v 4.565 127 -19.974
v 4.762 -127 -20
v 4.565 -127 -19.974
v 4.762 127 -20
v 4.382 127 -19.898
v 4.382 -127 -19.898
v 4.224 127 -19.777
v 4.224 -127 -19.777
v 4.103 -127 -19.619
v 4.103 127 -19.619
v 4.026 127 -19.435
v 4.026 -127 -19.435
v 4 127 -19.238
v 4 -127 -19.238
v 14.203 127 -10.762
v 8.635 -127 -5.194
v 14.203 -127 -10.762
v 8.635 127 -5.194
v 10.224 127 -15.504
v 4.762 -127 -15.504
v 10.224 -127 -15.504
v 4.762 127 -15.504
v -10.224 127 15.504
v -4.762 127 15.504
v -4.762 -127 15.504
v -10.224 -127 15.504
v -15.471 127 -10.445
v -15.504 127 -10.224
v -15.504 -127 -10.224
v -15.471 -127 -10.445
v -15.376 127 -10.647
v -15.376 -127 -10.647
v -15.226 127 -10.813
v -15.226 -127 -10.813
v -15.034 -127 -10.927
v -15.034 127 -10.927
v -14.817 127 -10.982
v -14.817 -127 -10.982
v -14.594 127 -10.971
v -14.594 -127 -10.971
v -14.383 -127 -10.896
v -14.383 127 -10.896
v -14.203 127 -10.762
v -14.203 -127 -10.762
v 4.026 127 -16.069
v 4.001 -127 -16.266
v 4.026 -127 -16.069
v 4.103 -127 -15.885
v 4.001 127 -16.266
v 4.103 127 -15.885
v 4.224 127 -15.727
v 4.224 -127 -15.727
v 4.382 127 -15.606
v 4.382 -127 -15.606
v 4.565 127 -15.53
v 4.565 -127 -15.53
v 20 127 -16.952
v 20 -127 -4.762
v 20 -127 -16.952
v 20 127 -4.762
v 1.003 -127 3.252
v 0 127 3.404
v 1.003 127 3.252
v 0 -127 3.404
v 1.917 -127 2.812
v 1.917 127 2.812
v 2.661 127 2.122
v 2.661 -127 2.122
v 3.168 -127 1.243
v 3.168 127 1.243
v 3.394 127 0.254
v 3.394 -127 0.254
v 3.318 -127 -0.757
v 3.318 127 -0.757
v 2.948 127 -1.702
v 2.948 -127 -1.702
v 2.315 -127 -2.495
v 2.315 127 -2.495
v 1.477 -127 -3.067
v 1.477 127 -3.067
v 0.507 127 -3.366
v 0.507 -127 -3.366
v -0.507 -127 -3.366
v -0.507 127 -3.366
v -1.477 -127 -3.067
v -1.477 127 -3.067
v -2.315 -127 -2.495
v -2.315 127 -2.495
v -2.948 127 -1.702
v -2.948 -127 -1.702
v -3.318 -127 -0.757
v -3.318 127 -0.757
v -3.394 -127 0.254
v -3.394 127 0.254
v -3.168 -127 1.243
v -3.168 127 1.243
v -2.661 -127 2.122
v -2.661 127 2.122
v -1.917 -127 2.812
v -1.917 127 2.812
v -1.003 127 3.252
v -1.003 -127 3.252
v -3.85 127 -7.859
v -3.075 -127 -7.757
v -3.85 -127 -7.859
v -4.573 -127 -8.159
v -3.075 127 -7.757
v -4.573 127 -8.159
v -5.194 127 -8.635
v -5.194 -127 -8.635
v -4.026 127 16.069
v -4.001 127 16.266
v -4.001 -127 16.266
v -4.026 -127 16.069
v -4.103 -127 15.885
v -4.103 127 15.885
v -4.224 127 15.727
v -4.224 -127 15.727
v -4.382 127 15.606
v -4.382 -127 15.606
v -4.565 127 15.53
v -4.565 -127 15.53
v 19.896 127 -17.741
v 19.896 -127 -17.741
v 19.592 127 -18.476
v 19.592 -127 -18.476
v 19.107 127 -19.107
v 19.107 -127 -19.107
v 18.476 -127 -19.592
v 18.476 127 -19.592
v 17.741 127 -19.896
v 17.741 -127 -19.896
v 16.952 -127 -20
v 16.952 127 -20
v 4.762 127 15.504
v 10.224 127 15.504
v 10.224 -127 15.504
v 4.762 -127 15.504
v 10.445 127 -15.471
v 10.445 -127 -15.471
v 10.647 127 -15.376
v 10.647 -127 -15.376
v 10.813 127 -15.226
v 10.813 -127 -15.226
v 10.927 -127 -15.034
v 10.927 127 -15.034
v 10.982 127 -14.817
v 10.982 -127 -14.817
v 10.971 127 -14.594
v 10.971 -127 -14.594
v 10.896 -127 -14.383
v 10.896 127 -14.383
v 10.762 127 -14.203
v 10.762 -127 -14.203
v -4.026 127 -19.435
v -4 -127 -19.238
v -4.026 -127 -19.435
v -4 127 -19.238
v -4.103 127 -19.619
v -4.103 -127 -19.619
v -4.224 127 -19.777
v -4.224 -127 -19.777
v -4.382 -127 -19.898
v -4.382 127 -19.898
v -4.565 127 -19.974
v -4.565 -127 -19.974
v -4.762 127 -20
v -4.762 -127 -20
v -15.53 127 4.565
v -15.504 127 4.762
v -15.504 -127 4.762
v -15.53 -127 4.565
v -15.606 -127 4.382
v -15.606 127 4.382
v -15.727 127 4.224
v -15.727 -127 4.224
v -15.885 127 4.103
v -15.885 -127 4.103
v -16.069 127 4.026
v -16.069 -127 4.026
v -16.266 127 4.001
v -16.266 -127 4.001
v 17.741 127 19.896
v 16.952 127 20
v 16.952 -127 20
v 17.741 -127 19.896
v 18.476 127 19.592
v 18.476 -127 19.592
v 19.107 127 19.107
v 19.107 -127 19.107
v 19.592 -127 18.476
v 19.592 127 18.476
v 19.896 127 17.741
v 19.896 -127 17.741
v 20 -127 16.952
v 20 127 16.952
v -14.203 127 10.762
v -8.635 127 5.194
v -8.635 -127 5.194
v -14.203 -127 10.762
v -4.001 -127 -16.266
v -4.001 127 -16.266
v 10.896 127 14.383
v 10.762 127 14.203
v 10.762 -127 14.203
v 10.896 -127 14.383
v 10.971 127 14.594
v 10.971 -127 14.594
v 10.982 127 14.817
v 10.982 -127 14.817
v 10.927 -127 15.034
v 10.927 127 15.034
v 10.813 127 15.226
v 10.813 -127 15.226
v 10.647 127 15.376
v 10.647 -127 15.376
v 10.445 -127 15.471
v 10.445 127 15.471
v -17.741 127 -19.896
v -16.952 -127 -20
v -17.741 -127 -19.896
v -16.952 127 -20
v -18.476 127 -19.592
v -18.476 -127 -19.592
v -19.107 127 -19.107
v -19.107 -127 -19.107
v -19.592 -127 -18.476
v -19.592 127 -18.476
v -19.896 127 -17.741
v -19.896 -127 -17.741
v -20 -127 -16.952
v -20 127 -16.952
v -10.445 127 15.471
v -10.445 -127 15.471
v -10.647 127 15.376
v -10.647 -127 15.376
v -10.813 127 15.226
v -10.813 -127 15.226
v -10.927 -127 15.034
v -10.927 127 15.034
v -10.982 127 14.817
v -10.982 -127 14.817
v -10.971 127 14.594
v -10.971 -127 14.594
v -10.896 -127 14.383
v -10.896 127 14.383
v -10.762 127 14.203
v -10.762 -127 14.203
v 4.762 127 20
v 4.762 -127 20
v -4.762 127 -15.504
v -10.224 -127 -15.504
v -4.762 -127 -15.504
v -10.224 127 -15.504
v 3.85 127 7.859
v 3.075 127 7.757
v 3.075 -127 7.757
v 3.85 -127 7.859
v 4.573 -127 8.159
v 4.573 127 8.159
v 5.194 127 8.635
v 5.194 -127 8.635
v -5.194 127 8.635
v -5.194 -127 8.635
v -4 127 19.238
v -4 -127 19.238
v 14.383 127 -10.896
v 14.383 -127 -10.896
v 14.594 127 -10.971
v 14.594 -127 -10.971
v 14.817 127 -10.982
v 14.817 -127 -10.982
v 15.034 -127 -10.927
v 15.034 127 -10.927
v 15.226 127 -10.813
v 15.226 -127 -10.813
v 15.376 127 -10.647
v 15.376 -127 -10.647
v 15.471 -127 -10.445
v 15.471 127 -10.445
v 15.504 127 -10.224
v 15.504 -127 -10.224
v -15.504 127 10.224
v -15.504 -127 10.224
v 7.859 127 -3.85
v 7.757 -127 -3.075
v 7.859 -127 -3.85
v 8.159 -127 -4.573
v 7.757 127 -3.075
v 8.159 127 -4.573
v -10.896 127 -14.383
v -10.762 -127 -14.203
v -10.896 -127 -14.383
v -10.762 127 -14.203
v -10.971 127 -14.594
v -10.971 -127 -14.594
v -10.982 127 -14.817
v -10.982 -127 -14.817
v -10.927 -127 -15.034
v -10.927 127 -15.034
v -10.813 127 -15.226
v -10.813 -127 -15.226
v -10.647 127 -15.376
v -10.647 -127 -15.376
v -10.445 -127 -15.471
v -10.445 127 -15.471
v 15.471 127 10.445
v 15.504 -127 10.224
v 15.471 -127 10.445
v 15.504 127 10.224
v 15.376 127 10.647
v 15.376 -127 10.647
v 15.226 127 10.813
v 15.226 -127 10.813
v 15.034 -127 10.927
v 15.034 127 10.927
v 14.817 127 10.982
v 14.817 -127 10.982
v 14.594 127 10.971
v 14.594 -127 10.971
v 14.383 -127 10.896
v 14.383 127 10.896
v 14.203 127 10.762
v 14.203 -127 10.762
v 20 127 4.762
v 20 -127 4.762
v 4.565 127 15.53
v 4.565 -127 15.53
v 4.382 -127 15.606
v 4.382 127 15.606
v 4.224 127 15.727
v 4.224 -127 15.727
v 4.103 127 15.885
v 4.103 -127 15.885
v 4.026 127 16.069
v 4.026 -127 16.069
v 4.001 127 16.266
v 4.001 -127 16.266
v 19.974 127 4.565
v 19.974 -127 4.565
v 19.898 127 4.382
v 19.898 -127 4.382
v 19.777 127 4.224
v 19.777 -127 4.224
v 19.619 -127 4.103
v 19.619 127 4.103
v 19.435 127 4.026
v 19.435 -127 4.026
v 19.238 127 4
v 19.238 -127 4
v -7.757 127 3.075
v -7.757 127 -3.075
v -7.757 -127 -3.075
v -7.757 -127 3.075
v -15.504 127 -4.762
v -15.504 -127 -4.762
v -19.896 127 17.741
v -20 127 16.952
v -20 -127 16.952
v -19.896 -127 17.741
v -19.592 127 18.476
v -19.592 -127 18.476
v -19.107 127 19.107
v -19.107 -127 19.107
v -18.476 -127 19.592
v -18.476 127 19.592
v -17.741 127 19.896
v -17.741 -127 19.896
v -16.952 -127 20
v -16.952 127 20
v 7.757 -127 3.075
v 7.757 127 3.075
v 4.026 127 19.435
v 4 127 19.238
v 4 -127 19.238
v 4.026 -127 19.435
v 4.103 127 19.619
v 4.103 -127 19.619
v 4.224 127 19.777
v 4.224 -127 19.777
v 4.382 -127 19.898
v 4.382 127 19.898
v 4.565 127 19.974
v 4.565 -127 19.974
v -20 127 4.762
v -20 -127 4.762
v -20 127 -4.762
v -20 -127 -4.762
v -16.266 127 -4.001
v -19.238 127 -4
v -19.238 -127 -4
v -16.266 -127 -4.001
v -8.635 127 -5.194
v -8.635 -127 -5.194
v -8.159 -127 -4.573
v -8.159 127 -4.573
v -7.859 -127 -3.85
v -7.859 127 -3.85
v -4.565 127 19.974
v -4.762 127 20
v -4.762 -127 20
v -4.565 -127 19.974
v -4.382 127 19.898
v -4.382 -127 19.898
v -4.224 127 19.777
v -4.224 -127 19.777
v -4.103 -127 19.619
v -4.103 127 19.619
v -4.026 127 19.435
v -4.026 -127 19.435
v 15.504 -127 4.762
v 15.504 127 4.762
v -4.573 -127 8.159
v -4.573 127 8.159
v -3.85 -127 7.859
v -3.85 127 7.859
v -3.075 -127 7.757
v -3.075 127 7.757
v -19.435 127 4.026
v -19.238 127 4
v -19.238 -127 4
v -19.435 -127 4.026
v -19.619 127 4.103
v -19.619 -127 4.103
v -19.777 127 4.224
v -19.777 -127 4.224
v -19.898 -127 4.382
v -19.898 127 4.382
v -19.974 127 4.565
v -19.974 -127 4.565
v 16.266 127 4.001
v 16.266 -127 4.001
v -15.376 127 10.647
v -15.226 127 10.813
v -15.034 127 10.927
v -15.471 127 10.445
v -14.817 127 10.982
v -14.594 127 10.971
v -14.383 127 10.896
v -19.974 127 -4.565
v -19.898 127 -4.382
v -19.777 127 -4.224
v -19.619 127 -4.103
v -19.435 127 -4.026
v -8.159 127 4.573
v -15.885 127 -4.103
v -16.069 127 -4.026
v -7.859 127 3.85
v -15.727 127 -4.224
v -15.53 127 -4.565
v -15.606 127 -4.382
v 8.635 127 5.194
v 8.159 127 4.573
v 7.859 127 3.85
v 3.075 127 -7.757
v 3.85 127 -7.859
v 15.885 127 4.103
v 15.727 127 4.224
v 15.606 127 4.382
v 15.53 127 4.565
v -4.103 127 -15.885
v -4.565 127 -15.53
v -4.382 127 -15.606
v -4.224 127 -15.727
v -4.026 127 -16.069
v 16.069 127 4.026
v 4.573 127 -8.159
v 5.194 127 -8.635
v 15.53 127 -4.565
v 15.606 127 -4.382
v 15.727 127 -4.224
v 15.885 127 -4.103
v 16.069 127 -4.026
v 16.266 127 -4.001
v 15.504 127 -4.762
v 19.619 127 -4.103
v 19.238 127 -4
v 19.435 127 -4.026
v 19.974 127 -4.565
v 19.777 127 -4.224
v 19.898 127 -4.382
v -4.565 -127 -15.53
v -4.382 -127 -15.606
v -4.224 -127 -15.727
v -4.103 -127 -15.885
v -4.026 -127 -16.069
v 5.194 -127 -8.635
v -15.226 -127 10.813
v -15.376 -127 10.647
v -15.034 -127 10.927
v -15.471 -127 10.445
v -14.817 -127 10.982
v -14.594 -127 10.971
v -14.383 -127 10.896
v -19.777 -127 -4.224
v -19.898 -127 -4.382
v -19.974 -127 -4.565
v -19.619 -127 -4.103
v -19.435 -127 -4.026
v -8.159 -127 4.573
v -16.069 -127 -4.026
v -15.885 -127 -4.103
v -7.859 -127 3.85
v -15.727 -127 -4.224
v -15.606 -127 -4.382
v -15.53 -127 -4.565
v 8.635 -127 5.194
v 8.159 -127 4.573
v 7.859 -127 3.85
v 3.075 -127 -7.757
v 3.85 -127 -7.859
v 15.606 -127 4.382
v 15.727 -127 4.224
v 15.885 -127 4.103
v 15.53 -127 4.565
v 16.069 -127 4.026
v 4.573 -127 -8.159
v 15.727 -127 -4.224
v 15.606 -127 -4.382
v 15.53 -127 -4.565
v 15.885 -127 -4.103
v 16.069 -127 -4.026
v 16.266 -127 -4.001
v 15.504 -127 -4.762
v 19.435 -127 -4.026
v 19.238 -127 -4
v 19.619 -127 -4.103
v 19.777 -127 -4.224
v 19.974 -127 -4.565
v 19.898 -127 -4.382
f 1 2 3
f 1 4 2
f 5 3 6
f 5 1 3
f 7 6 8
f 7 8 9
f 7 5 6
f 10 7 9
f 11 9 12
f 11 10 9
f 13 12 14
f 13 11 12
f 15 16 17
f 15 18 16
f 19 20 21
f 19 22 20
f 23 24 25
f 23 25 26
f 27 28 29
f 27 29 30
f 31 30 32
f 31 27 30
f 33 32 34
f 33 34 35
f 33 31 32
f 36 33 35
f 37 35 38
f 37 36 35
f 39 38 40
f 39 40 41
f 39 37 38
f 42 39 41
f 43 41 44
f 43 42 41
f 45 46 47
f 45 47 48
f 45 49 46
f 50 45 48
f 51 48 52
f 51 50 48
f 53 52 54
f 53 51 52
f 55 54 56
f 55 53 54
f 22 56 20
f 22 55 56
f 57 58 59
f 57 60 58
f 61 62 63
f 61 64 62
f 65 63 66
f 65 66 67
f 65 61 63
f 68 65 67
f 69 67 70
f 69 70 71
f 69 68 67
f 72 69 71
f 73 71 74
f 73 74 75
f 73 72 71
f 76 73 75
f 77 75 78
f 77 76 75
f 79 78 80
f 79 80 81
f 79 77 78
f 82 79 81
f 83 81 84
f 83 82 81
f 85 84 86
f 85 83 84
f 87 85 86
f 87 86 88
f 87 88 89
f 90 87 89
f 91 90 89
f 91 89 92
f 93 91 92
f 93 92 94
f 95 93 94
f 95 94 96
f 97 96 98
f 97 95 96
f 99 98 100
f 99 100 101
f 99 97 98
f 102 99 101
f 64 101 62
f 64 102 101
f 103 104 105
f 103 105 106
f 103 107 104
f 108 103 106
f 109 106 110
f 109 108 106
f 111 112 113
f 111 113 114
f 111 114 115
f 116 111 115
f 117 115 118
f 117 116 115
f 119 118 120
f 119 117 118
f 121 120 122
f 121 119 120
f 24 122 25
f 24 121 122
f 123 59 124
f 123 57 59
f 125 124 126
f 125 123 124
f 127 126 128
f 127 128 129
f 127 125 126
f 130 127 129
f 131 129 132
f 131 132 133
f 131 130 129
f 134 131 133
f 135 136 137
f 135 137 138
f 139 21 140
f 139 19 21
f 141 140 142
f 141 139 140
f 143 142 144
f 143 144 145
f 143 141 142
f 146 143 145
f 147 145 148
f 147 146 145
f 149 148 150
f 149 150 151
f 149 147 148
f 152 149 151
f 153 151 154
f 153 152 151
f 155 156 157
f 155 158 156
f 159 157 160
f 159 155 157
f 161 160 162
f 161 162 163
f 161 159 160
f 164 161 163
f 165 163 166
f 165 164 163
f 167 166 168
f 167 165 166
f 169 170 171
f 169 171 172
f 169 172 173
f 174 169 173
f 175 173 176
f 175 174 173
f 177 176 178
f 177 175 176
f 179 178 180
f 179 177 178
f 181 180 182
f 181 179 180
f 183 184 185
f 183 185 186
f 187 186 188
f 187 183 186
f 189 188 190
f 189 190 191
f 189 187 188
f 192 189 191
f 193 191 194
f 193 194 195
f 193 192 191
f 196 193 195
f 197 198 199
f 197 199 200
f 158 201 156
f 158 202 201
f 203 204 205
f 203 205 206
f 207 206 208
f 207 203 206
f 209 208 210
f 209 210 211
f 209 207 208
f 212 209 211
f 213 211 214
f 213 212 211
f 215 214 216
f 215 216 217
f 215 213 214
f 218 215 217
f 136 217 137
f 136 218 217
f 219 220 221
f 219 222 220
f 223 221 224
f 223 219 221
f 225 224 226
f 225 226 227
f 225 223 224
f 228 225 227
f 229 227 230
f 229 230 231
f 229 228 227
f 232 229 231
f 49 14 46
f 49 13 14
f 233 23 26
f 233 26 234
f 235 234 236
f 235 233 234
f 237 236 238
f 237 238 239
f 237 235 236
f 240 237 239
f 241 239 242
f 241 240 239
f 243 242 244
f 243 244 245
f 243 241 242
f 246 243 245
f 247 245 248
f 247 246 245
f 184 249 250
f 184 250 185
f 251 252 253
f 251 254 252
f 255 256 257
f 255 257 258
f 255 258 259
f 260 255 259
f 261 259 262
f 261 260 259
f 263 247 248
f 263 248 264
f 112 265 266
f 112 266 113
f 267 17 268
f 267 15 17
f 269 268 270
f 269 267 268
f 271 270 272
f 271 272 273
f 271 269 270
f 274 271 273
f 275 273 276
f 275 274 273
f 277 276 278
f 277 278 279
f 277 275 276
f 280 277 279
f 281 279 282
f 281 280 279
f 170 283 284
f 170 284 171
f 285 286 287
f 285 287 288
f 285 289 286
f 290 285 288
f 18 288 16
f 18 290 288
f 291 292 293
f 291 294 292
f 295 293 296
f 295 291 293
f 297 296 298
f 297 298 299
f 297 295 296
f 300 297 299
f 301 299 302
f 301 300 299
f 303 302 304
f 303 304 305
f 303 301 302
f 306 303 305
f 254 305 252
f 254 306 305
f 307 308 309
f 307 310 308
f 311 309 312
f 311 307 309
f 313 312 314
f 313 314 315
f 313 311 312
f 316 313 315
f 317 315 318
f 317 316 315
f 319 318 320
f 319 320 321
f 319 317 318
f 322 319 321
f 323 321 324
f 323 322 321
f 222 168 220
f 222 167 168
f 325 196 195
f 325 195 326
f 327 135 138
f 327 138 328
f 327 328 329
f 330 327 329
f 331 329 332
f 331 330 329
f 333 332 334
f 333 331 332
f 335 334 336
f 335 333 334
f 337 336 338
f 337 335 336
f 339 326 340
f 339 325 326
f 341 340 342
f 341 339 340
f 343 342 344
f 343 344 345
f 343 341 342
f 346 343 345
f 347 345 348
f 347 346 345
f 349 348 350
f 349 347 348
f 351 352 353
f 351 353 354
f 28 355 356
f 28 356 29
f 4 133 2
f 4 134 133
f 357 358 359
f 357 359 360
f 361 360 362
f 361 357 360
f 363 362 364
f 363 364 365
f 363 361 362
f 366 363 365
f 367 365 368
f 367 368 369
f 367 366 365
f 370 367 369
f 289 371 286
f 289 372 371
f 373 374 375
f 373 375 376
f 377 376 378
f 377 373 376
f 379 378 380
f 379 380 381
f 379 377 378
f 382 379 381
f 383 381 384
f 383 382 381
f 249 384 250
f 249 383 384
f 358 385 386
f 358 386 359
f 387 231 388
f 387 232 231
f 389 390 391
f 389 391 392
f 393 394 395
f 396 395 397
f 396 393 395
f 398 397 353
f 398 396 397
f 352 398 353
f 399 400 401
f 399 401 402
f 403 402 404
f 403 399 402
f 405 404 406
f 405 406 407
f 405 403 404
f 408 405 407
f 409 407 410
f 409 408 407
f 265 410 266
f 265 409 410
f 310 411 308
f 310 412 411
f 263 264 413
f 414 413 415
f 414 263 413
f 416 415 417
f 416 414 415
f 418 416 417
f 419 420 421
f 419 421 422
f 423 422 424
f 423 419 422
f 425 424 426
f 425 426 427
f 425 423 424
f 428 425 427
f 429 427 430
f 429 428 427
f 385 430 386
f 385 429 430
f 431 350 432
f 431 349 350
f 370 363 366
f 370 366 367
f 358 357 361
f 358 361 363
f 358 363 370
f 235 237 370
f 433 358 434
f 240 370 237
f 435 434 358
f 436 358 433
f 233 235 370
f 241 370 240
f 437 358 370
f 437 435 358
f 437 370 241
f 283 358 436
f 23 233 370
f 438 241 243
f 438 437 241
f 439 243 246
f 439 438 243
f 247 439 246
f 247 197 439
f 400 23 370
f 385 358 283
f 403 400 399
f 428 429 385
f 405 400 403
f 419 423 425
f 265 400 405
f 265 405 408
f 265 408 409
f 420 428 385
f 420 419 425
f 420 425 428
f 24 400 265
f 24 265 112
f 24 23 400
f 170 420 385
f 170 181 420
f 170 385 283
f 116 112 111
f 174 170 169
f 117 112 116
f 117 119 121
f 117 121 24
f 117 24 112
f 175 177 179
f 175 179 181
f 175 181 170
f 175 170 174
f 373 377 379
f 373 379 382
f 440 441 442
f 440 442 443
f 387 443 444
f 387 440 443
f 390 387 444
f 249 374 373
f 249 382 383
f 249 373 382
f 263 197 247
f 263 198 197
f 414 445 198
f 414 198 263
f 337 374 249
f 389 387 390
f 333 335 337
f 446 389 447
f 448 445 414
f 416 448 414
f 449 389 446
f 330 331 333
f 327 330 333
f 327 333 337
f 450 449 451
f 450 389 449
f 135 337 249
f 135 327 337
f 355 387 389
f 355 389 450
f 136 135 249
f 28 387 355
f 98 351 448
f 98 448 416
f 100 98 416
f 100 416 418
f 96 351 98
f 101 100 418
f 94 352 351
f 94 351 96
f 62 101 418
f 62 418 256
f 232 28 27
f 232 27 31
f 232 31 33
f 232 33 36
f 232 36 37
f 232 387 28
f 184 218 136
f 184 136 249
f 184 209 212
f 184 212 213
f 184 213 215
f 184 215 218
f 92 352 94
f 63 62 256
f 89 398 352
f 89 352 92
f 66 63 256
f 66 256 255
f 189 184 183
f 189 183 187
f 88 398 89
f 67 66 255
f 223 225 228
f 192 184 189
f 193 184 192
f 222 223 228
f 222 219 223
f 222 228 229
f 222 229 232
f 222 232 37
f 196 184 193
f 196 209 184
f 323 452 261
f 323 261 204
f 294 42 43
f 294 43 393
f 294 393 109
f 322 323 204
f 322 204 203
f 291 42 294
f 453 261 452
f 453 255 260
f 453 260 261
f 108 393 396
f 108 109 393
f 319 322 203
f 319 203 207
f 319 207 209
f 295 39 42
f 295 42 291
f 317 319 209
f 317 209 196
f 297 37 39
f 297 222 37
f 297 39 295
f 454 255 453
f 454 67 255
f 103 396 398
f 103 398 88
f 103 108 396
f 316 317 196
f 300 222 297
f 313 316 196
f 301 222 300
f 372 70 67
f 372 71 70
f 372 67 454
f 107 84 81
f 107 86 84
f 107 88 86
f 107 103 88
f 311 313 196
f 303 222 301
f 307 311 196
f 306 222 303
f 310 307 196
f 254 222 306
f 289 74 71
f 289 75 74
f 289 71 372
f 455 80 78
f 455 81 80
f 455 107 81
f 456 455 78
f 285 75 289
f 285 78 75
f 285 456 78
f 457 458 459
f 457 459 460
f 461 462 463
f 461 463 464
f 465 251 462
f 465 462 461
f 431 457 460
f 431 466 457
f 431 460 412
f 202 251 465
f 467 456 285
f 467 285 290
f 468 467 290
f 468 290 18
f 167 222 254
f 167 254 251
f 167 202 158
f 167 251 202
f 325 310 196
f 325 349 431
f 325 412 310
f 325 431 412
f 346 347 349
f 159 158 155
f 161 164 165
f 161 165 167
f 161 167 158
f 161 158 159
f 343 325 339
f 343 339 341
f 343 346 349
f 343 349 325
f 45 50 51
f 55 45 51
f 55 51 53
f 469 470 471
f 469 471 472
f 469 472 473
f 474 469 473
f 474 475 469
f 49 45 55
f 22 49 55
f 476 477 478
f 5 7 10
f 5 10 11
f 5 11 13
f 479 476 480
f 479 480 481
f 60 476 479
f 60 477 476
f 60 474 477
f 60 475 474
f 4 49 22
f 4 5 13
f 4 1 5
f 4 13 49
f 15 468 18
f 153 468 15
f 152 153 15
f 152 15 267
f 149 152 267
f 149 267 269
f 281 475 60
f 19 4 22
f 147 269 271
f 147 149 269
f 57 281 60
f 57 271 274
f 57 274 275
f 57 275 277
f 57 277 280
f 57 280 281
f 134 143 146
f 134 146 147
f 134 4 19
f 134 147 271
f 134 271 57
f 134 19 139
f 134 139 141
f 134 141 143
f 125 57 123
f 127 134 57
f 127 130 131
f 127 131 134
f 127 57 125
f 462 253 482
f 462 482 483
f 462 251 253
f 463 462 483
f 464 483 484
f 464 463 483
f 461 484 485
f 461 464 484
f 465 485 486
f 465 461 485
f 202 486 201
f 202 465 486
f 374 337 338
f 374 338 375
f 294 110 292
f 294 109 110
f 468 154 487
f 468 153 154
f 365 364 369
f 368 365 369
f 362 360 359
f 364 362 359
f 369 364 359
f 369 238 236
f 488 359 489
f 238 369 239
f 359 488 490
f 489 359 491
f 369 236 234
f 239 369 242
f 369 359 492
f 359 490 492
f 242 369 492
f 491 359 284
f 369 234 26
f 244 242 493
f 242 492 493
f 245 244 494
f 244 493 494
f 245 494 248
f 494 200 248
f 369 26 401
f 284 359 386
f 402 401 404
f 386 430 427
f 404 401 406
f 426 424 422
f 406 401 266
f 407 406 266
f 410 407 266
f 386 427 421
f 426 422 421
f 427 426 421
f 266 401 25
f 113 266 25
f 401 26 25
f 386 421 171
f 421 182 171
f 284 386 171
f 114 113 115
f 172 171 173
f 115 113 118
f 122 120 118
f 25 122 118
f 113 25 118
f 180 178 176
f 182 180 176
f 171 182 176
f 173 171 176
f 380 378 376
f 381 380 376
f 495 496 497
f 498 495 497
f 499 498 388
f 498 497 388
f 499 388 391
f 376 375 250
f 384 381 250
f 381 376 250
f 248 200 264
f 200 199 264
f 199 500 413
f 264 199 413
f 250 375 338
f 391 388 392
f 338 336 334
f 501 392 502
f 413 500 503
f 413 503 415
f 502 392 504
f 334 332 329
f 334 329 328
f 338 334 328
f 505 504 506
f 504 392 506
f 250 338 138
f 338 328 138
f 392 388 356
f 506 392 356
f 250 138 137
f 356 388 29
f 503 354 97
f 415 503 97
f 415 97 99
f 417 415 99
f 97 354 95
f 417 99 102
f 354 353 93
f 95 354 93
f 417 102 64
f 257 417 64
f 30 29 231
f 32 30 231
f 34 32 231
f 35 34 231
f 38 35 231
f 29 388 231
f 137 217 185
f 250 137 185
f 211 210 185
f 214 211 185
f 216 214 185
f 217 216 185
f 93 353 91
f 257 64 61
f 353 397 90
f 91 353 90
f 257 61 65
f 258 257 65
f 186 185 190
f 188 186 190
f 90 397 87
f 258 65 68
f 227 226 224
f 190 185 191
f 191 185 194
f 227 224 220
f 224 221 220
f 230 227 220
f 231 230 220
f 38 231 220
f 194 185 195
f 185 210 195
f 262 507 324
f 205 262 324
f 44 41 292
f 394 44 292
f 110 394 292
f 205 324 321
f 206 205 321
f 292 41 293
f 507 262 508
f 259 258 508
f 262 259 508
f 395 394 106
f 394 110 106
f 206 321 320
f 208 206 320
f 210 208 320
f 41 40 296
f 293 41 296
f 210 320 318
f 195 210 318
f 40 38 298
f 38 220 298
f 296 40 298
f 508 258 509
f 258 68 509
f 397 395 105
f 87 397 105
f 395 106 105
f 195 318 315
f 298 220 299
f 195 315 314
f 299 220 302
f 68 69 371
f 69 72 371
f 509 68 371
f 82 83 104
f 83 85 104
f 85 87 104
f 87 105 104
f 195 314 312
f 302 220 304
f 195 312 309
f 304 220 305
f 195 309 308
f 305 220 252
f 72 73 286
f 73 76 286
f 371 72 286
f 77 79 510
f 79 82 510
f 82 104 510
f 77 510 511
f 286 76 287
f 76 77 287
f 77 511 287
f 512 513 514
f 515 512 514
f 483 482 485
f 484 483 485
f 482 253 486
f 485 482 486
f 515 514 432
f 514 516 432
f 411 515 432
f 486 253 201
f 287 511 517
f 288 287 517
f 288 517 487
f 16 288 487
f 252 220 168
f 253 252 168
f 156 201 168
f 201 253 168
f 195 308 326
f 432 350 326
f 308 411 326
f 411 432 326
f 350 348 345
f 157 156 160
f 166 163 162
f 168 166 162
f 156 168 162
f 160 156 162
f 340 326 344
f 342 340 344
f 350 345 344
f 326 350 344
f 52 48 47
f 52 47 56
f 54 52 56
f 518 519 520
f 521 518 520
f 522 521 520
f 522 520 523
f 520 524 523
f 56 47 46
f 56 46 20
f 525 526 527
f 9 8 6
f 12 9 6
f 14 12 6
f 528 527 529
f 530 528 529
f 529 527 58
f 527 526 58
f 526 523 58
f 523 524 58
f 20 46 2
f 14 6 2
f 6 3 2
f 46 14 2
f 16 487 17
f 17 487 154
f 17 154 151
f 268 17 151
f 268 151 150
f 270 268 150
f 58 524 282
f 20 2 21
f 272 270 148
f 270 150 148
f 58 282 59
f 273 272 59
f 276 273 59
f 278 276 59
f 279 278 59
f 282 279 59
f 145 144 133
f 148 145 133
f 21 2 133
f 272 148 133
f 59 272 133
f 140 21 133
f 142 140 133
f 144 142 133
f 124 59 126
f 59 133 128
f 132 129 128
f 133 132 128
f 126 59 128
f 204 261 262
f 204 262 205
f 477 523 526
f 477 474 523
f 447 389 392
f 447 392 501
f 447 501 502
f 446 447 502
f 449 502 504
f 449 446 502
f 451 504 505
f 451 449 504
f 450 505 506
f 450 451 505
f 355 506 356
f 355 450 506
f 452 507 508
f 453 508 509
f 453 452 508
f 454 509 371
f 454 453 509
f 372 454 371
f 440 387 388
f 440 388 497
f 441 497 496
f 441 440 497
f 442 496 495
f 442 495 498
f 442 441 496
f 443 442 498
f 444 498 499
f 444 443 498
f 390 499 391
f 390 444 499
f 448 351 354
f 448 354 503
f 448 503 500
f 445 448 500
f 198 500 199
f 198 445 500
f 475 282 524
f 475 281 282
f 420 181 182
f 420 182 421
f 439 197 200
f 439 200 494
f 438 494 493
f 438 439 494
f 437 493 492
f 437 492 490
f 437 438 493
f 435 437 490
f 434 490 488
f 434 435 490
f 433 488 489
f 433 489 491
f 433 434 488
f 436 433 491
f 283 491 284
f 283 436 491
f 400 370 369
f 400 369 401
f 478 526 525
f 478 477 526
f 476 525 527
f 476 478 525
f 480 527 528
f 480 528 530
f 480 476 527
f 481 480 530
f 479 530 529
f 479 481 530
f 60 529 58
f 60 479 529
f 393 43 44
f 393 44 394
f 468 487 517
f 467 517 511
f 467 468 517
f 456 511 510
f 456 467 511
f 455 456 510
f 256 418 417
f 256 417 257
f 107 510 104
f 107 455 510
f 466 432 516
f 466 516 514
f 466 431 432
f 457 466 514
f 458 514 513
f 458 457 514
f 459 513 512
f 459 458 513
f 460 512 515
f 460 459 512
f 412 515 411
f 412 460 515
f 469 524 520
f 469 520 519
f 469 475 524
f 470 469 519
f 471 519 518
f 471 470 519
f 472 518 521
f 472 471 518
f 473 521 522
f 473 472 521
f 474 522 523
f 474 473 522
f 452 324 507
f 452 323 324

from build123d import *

# Parameters (mm, degrees)
SKETCH1_R           = 3.4036
BOSS_EXTRUDE1_DEPTH = 127


with BuildPart() as part:
    # Sketch1 → Boss-Extrude1 (new, symmetric)
    with BuildSketch(Plane(origin=(0, 0, 0), x_dir=(1, 0, 0), z_dir=(0, 1, 0))):
        with BuildLine():
            Line((-20, 16.952), (-20, 4.7625))
            ThreePointArc((-20, 4.7625), (-19.776815367, 4.223684633), (-19.238, 4.0005))
            Line((-19.238, 4.0005), (-16.2662, 4.0005))
            ThreePointArc((-16.2662, 4.0005), (-15.727384633, 4.223684633), (-15.5042, 4.7625))
            Line((-15.5042, 4.7625), (-15.5042, 10.2235))
            ThreePointArc((-15.5042, 10.2235), (-15.033804775, 10.927496204), (-14.203384633, 10.762315367))
            Line((-14.203384633, 10.762315367), (-8.635059555, 5.19399029))
            ThreePointArc((-8.635059555, 5.19399029), (-7.985348265, 4.221628629), (-7.7572, 3.074649845))
            Line((-7.7572, 3.074649845), (-7.7572, -3.074649845))
            ThreePointArc((-7.7572, -3.074649845), (-7.985348265, -4.221628629), (-8.635059555, -5.19399029))
            Line((-8.635059555, -5.19399029), (-14.203384633, -10.762315367))
            ThreePointArc((-14.203384633, -10.762315367), (-15.033804775, -10.927496204), (-15.5042, -10.2235))
            Line((-15.5042, -10.2235), (-15.5042, -4.7625))
            ThreePointArc((-15.5042, -4.7625), (-15.727384633, -4.223684633), (-16.2662, -4.0005))
            Line((-16.2662, -4.0005), (-19.238, -4.0005))
            ThreePointArc((-19.238, -4.0005), (-19.776815367, -4.223684633), (-20, -4.7625))
            Line((-20, -4.7625), (-20, -16.952))
            ThreePointArc((-20, -16.952), (-19.107261469, -19.107261469), (-16.952, -20))
            Line((-16.952, -20), (-4.7625, -20))
            ThreePointArc((-4.7625, -20), (-4.223684633, -19.776815367), (-4.0005, -19.238))
            Line((-4.0005, -19.238), (-4.0005, -16.2662))
            ThreePointArc((-4.0005, -16.2662), (-4.223684633, -15.727384633), (-4.7625, -15.5042))
            Line((-4.7625, -15.5042), (-10.2235, -15.5042))
            ThreePointArc((-10.2235, -15.5042), (-10.927496204, -15.033804775), (-10.762315367, -14.203384633))
            Line((-10.762315367, -14.203384633), (-5.19399029, -8.635059555))
            ThreePointArc((-5.19399029, -8.635059555), (-4.221628629, -7.985348265), (-3.074649845, -7.7572))
            Line((-3.074649845, -7.7572), (3.074649845, -7.7572))
            ThreePointArc((3.074649845, -7.7572), (4.221628629, -7.985348265), (5.19399029, -8.635059555))
            Line((5.19399029, -8.635059555), (10.762315367, -14.203384633))
            ThreePointArc((10.762315367, -14.203384633), (10.927496204, -15.033804775), (10.2235, -15.5042))
            Line((10.2235, -15.5042), (4.7625, -15.5042))
            ThreePointArc((4.7625, -15.5042), (4.223684633, -15.727384633), (4.0005, -16.2662))
            Line((4.0005, -16.2662), (4.0005, -19.238))
            ThreePointArc((4.0005, -19.238), (4.223684633, -19.776815367), (4.7625, -20))
            Line((4.7625, -20), (16.952, -20))
            ThreePointArc((16.952, -20), (19.107261469, -19.107261469), (20, -16.952))
            Line((20, -16.952), (20, -4.7625))
            ThreePointArc((20, -4.7625), (19.776815367, -4.223684633), (19.238, -4.0005))
            Line((19.238, -4.0005), (16.2662, -4.0005))
            ThreePointArc((16.2662, -4.0005), (15.727384633, -4.223684633), (15.5042, -4.7625))
            Line((15.5042, -4.7625), (15.5042, -10.2235))
            ThreePointArc((15.5042, -10.2235), (15.033804775, -10.927496204), (14.203384633, -10.762315367))
            Line((14.203384633, -10.762315367), (8.635059555, -5.19399029))
            ThreePointArc((8.635059555, -5.19399029), (7.985348265, -4.221628629), (7.7572, -3.074649845))
            Line((7.7572, -3.074649845), (7.7572, 3.074649845))
            ThreePointArc((7.7572, 3.074649845), (7.985348265, 4.221628629), (8.635059555, 5.19399029))
            Line((8.635059555, 5.19399029), (14.203384633, 10.762315367))
            ThreePointArc((14.203384633, 10.762315367), (15.033804775, 10.927496204), (15.5042, 10.2235))
            Line((15.5042, 10.2235), (15.5042, 4.7625))
            ThreePointArc((15.5042, 4.7625), (15.727384633, 4.223684633), (16.2662, 4.0005))
            Line((16.2662, 4.0005), (19.238, 4.0005))
            ThreePointArc((19.238, 4.0005), (19.776815367, 4.223684633), (20, 4.7625))
            Line((20, 4.7625), (20, 16.952))
            ThreePointArc((20, 16.952), (19.107261469, 19.107261469), (16.952, 20))
            Line((16.952, 20), (4.7625, 20))
            ThreePointArc((4.7625, 20), (4.223684633, 19.776815367), (4.0005, 19.238))
            Line((4.0005, 19.238), (4.0005, 16.2662))
            ThreePointArc((4.0005, 16.2662), (4.223684633, 15.727384633), (4.7625, 15.5042))
            Line((4.7625, 15.5042), (10.2235, 15.5042))
            ThreePointArc((10.2235, 15.5042), (10.927496204, 15.033804775), (10.762315367, 14.203384633))
            Line((10.762315367, 14.203384633), (5.19399029, 8.635059555))
            ThreePointArc((5.19399029, 8.635059555), (4.221628629, 7.985348265), (3.074649845, 7.7572))
            Line((3.074649845, 7.7572), (-3.074649845, 7.7572))
            ThreePointArc((-3.074649845, 7.7572), (-4.221628629, 7.985348265), (-5.19399029, 8.635059555))
            Line((-5.19399029, 8.635059555), (-10.762315367, 14.203384633))
            ThreePointArc((-10.762315367, 14.203384633), (-10.927496204, 15.033804775), (-10.2235, 15.5042))
            Line((-10.2235, 15.5042), (-4.7625, 15.5042))
            ThreePointArc((-4.7625, 15.5042), (-4.223684633, 15.727384633), (-4.0005, 16.2662))
            Line((-4.0005, 16.2662), (-4.0005, 19.238))
            ThreePointArc((-4.0005, 19.238), (-4.223684633, 19.776815367), (-4.7625, 20))
            Line((-4.7625, 20), (-16.952, 20))
            ThreePointArc((-16.952, 20), (-19.107261469, 19.107261469), (-20, 16.952))
        make_face()
        with Locations(Location((0, 0, 0), (0, 0, 270))):
            Circle(SKETCH1_R, mode=Mode.SUBTRACT)
    extrude(amount=BOSS_EXTRUDE1_DEPTH, both=True)


solid = part.part
